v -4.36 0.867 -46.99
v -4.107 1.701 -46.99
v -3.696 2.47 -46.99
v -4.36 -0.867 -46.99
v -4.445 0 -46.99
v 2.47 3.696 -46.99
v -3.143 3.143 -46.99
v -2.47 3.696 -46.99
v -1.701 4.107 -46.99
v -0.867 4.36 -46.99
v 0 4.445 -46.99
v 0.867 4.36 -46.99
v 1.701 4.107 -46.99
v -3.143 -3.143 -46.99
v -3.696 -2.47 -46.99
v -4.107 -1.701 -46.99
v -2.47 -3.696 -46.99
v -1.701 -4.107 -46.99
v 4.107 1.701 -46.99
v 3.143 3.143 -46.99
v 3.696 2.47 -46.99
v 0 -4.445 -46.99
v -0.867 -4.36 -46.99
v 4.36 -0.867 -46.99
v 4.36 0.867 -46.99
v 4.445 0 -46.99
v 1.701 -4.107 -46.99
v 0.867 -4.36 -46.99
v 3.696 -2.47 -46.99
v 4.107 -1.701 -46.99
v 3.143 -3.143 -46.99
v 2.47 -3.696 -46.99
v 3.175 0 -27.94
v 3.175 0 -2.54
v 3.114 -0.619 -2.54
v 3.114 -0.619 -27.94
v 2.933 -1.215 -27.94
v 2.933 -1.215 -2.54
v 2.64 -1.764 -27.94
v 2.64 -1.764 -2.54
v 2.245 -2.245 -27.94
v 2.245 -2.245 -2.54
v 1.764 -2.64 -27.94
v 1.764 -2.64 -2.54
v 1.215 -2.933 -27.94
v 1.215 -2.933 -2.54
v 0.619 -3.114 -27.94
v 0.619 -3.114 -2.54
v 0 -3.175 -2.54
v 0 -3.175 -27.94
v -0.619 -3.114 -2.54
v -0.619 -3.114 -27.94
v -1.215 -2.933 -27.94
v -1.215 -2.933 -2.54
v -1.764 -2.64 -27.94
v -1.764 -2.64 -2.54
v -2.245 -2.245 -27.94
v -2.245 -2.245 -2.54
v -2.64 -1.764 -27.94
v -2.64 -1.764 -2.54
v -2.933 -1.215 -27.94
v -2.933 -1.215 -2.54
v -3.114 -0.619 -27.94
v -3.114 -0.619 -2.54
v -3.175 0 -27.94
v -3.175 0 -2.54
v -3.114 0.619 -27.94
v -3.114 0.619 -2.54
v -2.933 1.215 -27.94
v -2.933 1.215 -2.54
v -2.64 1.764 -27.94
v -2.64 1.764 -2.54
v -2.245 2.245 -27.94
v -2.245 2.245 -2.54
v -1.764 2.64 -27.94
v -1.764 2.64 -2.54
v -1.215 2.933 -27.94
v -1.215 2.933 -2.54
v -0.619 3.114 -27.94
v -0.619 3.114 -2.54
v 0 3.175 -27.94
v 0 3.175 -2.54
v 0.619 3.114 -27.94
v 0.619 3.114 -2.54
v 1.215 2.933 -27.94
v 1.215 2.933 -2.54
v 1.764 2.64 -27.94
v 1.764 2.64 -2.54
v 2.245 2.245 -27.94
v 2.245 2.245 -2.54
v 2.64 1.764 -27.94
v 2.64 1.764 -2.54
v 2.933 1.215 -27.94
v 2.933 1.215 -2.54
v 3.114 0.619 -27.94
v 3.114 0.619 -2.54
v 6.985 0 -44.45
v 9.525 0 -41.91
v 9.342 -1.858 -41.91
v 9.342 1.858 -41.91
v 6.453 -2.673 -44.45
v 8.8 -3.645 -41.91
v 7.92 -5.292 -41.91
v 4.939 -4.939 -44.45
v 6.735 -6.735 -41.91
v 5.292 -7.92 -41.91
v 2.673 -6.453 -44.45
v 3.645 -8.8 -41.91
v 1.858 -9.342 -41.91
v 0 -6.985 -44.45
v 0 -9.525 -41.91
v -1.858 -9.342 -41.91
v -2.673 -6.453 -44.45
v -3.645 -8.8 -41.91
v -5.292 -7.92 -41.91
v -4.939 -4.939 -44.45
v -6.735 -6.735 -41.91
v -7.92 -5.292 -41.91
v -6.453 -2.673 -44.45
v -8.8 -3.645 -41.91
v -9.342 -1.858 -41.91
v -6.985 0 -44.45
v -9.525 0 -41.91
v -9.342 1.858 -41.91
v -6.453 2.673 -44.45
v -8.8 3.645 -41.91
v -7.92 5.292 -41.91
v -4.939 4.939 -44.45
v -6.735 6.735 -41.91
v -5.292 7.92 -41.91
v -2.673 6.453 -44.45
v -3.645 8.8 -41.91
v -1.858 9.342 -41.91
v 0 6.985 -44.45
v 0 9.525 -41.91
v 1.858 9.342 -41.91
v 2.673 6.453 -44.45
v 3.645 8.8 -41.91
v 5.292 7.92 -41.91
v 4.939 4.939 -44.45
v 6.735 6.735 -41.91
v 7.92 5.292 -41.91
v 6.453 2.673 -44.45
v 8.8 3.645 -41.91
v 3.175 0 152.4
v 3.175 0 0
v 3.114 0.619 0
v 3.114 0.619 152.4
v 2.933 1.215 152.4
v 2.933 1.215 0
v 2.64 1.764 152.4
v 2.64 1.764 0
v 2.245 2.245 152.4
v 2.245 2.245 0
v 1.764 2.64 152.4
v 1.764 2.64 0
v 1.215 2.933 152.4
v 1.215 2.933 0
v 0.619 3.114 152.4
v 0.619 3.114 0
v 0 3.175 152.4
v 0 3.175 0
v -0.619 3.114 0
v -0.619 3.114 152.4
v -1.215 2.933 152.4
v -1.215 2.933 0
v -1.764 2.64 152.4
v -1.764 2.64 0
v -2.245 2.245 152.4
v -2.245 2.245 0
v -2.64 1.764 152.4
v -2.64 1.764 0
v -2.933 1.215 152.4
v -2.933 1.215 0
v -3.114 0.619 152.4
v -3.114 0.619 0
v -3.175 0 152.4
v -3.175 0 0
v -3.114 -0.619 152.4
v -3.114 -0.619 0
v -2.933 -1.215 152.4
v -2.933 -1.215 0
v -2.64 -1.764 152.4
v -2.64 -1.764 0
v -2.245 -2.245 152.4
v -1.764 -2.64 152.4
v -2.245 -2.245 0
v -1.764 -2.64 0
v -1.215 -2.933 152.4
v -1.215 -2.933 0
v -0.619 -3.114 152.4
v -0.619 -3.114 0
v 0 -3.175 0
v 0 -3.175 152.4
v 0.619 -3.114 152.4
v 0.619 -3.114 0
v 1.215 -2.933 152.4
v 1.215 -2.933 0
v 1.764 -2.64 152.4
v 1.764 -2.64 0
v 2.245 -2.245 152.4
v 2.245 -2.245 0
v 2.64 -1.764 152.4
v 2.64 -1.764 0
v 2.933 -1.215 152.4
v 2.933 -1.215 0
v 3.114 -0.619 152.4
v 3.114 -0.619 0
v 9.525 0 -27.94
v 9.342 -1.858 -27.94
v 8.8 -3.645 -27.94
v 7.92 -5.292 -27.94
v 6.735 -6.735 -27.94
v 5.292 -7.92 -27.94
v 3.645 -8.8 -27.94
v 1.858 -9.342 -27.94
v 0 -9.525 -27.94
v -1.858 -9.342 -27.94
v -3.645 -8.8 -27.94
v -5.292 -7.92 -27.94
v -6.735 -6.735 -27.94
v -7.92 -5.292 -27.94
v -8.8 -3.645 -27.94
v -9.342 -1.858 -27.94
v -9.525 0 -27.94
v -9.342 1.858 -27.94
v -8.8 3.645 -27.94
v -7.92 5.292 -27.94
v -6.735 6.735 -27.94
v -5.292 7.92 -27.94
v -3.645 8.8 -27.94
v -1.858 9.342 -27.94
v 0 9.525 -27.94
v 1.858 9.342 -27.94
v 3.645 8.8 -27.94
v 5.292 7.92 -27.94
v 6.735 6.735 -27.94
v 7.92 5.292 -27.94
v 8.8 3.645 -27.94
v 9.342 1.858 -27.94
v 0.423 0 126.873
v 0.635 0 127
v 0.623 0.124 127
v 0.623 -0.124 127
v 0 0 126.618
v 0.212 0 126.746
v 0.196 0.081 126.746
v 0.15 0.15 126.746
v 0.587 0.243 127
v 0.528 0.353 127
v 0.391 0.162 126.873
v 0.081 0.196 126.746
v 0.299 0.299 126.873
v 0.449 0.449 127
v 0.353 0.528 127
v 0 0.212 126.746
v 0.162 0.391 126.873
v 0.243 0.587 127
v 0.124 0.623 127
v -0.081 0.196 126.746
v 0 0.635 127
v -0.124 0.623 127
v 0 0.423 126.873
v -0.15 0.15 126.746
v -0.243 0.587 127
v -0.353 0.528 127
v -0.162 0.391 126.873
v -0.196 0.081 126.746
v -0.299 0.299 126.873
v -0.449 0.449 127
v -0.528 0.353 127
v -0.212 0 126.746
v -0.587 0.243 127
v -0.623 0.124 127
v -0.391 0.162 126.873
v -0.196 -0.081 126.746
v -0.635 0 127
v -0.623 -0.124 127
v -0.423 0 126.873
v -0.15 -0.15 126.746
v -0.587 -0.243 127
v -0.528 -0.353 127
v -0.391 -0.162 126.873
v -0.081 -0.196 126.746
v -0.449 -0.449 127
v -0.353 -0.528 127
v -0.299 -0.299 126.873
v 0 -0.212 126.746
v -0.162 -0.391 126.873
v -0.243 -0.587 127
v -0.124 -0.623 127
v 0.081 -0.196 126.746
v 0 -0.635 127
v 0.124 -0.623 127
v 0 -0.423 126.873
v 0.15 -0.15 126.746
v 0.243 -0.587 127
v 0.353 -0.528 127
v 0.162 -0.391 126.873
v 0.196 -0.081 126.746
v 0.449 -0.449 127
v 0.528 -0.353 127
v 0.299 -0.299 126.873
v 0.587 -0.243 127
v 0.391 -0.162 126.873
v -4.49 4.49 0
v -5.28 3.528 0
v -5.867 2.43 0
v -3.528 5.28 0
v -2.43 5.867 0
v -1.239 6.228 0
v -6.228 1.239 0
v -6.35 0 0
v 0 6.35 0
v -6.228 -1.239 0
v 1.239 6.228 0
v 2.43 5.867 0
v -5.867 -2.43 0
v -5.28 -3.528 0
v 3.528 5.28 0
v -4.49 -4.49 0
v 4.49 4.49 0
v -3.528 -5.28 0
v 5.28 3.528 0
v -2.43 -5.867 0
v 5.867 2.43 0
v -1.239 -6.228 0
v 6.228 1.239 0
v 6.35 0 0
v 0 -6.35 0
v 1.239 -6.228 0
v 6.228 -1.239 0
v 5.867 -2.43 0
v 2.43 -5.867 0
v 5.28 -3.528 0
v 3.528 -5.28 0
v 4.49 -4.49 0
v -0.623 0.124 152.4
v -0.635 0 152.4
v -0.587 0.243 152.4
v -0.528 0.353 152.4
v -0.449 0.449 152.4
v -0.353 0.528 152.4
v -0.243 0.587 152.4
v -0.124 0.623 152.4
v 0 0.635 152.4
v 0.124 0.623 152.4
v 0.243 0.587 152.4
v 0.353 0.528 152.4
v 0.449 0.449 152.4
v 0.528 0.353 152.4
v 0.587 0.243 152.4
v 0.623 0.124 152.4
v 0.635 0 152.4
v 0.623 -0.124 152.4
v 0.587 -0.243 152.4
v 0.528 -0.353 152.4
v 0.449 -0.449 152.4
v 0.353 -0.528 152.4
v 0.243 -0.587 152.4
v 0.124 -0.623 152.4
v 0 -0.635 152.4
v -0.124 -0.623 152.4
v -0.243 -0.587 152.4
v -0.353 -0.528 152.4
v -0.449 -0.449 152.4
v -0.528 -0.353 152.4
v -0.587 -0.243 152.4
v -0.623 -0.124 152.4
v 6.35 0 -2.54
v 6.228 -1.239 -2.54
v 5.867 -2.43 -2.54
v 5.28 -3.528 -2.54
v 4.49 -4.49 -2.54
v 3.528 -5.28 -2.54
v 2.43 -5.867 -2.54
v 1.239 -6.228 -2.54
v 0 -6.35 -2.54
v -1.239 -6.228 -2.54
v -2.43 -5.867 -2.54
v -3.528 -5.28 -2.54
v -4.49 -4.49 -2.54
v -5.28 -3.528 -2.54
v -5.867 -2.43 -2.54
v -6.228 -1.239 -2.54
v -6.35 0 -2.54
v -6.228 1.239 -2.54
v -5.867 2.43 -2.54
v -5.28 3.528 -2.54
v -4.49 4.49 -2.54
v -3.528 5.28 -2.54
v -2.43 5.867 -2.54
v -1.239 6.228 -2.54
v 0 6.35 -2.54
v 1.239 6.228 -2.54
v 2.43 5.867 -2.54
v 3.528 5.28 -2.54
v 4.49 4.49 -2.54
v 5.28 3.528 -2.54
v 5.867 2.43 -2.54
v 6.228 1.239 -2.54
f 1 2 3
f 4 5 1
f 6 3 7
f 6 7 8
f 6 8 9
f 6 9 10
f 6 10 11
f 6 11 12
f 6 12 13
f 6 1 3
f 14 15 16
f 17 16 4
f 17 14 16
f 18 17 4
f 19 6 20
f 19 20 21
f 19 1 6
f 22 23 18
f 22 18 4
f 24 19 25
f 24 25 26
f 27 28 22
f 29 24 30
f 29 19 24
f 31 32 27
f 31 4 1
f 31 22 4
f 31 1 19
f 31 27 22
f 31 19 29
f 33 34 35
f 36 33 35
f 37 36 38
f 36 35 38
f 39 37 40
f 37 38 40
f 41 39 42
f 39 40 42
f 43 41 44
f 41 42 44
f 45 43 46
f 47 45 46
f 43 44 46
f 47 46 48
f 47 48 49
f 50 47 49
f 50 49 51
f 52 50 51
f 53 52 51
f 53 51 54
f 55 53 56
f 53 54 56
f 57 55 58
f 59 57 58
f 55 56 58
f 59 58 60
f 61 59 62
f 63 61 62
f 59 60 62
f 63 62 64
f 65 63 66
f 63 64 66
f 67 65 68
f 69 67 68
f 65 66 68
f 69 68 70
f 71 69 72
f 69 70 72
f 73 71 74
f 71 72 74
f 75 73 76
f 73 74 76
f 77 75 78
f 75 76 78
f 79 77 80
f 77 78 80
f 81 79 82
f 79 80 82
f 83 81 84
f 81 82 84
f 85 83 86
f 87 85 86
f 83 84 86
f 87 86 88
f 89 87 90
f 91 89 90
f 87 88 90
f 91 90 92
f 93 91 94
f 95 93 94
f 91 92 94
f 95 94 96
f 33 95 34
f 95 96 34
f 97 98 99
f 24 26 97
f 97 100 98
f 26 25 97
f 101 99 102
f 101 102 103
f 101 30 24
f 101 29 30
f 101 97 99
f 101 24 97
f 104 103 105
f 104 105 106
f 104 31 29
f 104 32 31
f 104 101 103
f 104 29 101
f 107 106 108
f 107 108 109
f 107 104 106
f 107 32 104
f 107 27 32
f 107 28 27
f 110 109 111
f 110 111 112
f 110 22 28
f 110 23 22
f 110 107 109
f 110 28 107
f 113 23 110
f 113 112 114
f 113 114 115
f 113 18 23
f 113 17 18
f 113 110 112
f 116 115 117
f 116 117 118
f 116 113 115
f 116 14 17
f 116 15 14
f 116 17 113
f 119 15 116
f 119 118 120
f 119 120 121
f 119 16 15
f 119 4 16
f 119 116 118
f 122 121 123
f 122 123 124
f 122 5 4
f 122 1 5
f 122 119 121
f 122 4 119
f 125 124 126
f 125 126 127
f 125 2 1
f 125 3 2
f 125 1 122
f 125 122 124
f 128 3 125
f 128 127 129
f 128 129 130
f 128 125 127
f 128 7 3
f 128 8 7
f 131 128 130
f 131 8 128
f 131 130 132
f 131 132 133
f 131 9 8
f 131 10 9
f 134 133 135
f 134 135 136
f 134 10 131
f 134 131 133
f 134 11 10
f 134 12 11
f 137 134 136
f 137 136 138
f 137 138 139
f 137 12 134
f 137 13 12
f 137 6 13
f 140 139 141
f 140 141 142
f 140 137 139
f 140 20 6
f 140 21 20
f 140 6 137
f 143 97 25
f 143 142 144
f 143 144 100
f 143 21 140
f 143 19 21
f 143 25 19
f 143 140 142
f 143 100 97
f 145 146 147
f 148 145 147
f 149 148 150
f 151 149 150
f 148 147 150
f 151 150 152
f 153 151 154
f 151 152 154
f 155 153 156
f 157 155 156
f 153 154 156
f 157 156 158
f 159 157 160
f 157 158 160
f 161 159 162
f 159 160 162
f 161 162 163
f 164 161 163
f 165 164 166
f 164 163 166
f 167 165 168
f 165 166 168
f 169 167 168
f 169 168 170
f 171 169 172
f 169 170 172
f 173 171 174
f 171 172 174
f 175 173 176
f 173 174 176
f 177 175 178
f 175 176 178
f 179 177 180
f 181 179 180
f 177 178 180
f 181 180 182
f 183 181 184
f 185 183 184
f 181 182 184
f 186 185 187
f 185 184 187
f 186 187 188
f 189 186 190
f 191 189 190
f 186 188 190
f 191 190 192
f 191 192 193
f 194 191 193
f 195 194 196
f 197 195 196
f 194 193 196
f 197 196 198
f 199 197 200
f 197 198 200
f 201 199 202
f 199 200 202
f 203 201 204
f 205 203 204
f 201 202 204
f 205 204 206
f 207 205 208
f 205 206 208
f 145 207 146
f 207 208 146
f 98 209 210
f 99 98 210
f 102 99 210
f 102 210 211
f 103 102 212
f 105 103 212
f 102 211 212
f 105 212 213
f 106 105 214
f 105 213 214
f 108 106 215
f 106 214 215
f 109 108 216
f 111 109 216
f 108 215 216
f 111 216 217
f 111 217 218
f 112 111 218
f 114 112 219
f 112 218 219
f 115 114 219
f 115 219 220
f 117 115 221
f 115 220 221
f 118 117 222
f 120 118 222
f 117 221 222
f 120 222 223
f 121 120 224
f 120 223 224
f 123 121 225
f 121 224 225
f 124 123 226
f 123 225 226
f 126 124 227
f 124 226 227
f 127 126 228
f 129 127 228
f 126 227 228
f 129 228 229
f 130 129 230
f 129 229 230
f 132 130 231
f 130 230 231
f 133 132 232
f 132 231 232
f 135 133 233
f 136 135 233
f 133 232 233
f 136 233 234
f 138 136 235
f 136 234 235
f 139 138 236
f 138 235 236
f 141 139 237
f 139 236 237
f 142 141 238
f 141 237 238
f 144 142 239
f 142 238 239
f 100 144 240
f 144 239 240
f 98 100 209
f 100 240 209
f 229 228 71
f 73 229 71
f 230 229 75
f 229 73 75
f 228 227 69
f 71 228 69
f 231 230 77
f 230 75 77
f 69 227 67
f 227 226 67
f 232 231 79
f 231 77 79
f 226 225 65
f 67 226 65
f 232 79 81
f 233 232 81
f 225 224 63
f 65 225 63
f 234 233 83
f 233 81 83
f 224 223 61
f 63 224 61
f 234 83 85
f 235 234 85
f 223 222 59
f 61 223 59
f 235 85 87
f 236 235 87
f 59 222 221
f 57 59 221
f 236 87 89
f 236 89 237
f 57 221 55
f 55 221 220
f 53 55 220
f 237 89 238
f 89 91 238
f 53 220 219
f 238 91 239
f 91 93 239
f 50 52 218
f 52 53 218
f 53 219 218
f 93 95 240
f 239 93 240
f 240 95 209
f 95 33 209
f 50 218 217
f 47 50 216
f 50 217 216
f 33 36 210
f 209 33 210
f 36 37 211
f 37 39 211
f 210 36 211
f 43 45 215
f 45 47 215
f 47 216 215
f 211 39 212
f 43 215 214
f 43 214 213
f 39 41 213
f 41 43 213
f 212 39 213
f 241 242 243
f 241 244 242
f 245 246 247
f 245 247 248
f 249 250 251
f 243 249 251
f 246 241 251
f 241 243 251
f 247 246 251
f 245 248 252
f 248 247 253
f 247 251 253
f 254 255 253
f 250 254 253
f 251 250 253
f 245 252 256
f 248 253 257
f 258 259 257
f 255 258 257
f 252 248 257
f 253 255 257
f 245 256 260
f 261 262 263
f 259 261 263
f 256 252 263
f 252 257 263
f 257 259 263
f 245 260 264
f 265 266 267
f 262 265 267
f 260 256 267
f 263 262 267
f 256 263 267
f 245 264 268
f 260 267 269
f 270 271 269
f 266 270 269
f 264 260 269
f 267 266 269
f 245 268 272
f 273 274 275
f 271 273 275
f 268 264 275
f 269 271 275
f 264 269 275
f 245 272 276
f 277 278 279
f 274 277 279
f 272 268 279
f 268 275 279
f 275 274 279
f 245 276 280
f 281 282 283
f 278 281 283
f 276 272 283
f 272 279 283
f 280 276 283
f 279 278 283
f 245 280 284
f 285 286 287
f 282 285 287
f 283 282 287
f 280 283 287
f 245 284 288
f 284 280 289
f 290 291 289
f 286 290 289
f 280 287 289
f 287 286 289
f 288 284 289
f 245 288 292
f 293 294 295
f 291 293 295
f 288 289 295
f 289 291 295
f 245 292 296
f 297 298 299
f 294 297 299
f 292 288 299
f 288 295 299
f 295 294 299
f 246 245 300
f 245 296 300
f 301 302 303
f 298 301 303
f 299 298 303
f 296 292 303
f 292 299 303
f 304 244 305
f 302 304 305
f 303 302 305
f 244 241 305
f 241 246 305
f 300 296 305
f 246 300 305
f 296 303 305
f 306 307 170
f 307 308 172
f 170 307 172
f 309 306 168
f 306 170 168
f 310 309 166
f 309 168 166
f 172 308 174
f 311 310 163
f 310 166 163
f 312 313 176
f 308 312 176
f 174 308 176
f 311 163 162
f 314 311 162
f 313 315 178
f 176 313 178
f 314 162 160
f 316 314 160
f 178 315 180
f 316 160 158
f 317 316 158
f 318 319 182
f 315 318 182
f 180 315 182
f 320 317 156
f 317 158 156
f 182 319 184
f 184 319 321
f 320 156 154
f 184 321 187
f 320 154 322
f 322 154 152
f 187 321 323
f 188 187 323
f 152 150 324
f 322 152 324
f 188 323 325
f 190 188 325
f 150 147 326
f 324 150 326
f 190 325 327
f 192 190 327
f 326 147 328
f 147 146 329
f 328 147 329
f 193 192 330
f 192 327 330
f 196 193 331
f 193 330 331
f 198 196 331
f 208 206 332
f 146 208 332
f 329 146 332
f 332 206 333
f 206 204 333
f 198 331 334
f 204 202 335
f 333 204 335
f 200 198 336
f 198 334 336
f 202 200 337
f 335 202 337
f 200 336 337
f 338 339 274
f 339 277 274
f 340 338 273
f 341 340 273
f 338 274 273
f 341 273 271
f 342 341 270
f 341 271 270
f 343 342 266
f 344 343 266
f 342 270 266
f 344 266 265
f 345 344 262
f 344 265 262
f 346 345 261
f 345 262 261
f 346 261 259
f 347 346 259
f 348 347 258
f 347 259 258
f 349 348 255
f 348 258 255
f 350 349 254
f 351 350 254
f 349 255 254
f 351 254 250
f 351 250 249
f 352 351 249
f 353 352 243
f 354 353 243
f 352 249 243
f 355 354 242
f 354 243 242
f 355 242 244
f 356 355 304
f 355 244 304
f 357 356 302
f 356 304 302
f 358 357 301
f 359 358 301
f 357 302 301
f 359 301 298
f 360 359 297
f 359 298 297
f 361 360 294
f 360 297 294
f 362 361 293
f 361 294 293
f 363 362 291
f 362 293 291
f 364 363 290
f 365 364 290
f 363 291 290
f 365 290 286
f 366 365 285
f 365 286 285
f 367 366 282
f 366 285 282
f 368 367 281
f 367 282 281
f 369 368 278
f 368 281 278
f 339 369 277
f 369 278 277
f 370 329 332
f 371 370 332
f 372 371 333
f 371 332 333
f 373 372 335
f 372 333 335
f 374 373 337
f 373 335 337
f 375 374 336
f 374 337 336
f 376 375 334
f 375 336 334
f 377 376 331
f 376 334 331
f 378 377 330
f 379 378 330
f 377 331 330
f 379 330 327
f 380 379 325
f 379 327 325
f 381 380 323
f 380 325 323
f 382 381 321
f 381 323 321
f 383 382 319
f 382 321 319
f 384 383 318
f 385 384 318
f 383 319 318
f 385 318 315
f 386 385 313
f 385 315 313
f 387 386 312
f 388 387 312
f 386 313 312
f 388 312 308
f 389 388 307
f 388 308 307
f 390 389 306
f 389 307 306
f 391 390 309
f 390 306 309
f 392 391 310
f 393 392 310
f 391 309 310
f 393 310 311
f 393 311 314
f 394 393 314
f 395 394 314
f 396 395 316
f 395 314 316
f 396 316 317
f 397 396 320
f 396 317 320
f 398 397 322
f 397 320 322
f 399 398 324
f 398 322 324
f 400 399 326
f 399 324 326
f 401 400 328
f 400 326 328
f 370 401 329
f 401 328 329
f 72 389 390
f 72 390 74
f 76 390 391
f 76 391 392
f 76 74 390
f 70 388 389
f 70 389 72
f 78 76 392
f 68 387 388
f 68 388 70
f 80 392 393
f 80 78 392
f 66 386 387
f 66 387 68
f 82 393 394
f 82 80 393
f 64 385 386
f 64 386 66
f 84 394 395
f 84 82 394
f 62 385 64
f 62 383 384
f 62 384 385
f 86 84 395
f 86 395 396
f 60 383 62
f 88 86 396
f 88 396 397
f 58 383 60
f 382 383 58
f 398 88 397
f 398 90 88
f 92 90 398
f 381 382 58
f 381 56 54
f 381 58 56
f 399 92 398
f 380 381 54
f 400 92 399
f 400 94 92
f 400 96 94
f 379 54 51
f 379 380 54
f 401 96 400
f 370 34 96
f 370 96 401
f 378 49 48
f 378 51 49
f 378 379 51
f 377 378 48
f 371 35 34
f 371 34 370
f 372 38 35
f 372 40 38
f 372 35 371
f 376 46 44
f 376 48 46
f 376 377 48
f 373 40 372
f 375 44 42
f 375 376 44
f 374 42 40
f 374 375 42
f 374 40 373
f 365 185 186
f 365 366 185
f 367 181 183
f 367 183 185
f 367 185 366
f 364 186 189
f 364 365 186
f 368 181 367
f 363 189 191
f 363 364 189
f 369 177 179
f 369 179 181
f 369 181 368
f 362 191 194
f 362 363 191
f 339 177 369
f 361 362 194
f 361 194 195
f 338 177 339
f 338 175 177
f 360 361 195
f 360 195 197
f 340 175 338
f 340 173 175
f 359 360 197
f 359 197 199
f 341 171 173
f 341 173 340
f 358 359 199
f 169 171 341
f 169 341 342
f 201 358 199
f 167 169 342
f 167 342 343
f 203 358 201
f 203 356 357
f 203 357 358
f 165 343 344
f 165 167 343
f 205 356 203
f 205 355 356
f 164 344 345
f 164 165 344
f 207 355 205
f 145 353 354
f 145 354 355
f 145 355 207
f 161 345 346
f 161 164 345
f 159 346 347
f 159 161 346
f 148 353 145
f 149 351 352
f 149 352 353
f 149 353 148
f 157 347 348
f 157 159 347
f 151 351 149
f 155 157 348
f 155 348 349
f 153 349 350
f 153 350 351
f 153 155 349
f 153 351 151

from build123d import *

# Parameters (mm, degrees)
F0_R      = 3.175
F1_DEPTH  = 152.4
F2_R      = 6.35
F3_DEPTH  = 2.54
F4_R      = 3.175
F5_DEPTH  = 25.4
F6_R      = 9.525
F7_DEPTH  = 19.05
F8_SIZE   = 5.08
F10_D     = 1.27
F10_DEPTH = 25.4
F10_TIP   = 0.3815464931


with BuildPart() as f1:
    # F0 (on Top) → F1 (new body)
    with BuildSketch(Plane.XY):
        Circle(F0_R)
    extrude(amount=F1_DEPTH)

    # F2 (on face) → F3 (join)
    with BuildSketch(Plane(origin=(0, 0, 0), x_dir=(1, 0, 0), z_dir=(0, 0, -1))):
        Circle(F2_R)
    extrude(amount=F3_DEPTH)

    # F4 (on face) → F5 (join)
    with BuildSketch(Plane(origin=(0, 0, -2.54), x_dir=(1, 0, 0), z_dir=(0, 0, -1))):
        Circle(F4_R)
    extrude(amount=F5_DEPTH)

    # F6 (on face) → F7 (join)
    with BuildSketch(Plane(origin=(0, 0, -27.94), x_dir=(1, 0, 0), z_dir=(0, 0, -1))):
        Circle(F6_R)
    extrude(amount=F7_DEPTH)

    # F8
    f8_edges = [f1.edges().sort_by_distance(p)[0] for p in [
        (-9.525, 0, -46.99),
    ]]
    chamfer(f8_edges, length=F8_SIZE)

    # F10
    with Locations(Plane.XY.offset(152.4)):
        with Locations((0, 0)):
            Hole(F10_D / 2, depth=F10_DEPTH)
            with Locations((0, 0, -(F10_DEPTH + F10_TIP / 2))):  # 118° drill point
                Cone(0, F10_D / 2, F10_TIP, mode=Mode.SUBTRACT)


solid = f1.part
